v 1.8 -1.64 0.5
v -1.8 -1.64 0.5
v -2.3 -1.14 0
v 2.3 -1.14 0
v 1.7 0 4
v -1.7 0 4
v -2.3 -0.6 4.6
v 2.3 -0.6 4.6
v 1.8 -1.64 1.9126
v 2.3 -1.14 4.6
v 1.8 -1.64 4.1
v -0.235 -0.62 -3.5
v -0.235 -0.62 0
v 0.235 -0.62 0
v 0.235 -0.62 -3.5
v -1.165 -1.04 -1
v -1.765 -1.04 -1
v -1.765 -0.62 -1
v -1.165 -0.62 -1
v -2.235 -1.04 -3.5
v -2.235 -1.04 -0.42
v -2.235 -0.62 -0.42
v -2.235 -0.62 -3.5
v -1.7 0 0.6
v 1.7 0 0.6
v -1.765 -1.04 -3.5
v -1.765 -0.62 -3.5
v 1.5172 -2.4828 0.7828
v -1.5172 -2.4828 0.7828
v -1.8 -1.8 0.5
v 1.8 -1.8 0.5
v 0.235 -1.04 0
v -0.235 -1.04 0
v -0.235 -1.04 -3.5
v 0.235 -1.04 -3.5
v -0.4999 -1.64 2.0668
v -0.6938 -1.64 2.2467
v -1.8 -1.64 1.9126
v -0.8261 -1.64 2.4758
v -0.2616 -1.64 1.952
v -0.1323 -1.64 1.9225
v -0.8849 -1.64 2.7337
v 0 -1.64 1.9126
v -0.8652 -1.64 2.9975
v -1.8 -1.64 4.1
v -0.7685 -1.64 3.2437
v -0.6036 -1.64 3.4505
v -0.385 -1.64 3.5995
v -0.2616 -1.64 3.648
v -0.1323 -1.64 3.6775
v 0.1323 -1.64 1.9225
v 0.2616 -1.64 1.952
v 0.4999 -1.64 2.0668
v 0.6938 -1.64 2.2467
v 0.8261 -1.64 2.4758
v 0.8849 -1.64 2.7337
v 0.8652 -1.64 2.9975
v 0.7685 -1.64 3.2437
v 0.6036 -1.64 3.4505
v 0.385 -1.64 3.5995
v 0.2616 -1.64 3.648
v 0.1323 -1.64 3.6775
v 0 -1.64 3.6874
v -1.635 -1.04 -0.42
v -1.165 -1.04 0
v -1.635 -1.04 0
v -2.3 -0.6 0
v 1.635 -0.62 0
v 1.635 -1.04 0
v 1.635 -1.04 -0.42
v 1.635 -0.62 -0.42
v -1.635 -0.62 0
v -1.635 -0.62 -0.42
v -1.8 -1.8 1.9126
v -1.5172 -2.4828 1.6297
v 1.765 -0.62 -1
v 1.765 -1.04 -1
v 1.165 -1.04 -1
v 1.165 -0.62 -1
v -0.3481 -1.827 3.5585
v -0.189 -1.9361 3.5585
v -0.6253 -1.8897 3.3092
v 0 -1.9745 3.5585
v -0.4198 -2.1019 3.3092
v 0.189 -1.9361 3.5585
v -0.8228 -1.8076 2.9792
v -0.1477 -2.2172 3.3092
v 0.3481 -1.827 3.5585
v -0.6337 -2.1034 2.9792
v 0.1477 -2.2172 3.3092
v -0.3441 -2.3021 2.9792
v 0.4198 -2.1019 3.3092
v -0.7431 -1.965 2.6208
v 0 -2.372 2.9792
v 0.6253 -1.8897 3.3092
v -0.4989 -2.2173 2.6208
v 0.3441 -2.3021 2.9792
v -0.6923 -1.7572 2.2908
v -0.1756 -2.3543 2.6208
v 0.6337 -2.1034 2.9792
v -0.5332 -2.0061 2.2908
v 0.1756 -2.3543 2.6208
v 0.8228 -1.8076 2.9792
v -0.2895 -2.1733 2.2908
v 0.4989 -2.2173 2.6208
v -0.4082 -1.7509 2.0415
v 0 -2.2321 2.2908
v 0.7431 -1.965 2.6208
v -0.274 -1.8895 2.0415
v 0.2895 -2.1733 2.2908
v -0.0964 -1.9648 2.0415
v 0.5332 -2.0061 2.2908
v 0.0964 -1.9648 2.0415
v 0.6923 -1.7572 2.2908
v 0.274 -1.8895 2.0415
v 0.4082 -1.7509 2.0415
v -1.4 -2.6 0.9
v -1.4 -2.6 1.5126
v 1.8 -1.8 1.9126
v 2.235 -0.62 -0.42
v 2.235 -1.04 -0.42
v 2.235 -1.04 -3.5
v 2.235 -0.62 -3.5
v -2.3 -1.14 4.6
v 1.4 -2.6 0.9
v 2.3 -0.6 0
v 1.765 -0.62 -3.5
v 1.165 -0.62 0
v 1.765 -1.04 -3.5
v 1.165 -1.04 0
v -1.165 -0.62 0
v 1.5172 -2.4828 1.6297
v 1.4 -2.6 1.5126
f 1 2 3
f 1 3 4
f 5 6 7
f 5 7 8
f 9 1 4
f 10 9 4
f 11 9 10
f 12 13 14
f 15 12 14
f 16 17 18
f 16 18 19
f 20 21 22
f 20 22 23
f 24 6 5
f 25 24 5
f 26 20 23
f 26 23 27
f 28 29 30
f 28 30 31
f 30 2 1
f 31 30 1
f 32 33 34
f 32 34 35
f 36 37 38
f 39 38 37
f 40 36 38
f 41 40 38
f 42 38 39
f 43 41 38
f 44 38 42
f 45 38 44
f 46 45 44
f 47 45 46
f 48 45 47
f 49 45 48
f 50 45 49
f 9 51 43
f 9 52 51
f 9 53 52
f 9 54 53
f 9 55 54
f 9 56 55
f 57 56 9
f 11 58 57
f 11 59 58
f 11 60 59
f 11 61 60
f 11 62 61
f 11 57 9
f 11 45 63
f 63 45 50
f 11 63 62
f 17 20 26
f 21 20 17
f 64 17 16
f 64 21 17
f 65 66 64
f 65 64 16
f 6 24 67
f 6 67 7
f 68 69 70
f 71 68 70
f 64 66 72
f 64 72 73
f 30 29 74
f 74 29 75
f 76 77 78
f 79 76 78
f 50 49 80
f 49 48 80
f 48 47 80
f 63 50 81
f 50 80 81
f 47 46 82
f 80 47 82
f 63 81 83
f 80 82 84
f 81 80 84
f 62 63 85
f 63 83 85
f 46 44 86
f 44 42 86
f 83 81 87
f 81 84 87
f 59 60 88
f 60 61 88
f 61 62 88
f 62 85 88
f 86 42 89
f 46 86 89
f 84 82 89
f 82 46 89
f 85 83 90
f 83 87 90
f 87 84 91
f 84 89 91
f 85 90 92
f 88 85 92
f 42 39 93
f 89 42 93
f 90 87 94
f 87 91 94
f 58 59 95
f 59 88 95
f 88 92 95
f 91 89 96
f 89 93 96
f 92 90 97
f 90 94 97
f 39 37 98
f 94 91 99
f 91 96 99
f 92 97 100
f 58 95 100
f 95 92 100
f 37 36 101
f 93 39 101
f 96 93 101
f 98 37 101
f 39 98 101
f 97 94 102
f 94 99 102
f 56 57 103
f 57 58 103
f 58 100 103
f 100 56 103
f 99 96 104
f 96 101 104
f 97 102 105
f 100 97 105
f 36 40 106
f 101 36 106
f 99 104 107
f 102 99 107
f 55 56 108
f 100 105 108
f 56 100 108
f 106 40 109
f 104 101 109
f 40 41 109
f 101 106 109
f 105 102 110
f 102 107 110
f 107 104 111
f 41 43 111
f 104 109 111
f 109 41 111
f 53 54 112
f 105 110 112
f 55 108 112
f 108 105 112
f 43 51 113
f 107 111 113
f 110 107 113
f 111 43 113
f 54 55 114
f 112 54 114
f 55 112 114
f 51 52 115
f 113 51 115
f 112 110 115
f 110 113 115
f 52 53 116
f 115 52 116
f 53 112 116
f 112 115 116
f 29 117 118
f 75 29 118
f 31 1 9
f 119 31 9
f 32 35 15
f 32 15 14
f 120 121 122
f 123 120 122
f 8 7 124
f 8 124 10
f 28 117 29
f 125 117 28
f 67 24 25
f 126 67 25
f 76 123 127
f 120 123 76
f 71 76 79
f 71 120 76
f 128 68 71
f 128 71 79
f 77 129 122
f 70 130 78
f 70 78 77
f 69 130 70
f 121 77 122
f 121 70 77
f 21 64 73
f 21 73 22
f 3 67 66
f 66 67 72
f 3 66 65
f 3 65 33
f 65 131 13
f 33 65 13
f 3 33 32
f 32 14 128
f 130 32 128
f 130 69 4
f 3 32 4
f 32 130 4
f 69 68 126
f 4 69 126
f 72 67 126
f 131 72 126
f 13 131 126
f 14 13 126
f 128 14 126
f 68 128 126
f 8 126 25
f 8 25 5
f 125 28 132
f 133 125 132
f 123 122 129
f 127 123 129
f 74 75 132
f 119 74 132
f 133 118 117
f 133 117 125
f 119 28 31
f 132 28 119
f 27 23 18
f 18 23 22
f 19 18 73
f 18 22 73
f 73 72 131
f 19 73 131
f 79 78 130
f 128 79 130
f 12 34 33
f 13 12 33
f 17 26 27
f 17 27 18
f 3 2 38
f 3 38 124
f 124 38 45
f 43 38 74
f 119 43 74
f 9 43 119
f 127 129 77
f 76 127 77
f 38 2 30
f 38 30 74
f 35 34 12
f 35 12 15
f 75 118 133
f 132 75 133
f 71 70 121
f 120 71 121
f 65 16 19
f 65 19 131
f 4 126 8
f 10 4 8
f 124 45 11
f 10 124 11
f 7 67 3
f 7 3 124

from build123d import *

# Parameters (mm, degrees)
SKETCH_W         = 4.6
SKETCH_H         = 4.6
PAD_DEPTH        = 1.04
SKETCH001_W      = 0.47
SKETCH001_H      = 3.5
PAD001_DEPTH     = 0.42
CHAMFER_SIZE     = 0.6
SKETCH002_R      = 0.9
PAD002_DEPTH     = 0.45
REVOLUTION_ANGLE = 180
SKETCH004_W      = 4.6
SKETCH004_H      = 4.6
PAD003_DEPTH     = 0.6
CHAMFER001_SIZE  = 0.5
SKETCH005_W      = 3.6
SKETCH005_H      = 1.412588
PAD004_DEPTH     = 0.96
CHAMFER002_SIZE  = 0.4
CHAMFER003_SIZE  = 0.4


with BuildPart() as part:
    # Sketch → Pad (new body)
    with BuildSketch(Plane.XZ):
        with Locations((0, 2.3)):
            Rectangle(SKETCH_W, SKETCH_H)
    extrude(amount=PAD_DEPTH)

    # Sketch001 → Pad001 (new body)
    with BuildSketch(Plane.XZ.offset(1.04)):
        with Locations((0, -1.75)):
            Rectangle(SKETCH001_W, SKETCH001_H)
        Polygon((1.635, 0), (1.635, -0.42), (2.235, -0.42), (2.235, -3.5), (1.765, -3.5), (1.765, -1), (1.165, -1), (1.165, 0), align=None)
        Polygon((-1.635, 0), (-1.635, -0.42), (-2.235, -0.42), (-2.235, -3.5), (-1.765, -3.5), (-1.765, -1), (-1.165, -1), (-1.165, 0), align=None)
    extrude(amount=-PAD001_DEPTH)

    # Chamfer
    chamfer_edges = [part.edges().sort_by_distance(p)[0] for p in [
        (0, 0, 4.6),
        (2.3, 0, 2.3),
        (-2.3, 0, 2.3),
        (0, 0, 0),
    ]]
    chamfer(chamfer_edges, length=CHAMFER_SIZE)

    # Sketch002 → Pad002 (new body)
    with BuildSketch(Plane.XZ.offset(1.04)):
        with Locations((0, 2.8)):
            Circle(SKETCH002_R)
    extrude(amount=PAD002_DEPTH)

    # Sketch003 → Revolution (revolve)
    with BuildSketch(Plane.XZ.offset(1.49)):
        with BuildLine():
            ThreePointArc((-1.1e-05, 3.7), (-0.9, 2.8), (-1.1e-05, 1.9))
            Line((-1.1e-05, 3.7), (-1.1e-05, 1.9))
        make_face()
    revolve(axis=Axis((0, -1.49, 0), (0, 0, 1)), revolution_arc=REVOLUTION_ANGLE)

    # Sketch004 → Pad003 (new body)
    with BuildSketch(Plane.XZ.offset(1.04)):
        with Locations((0, 2.3)):
            Rectangle(SKETCH004_W, SKETCH004_H)
    extrude(amount=PAD003_DEPTH)

    # Chamfer001
    chamfer001_edges = [part.edges().sort_by_distance(p)[0] for p in [
        (0, -1.64, 4.6),
        (2.3, -1.64, 2.3),
        (0, -1.64, 0),
        (-2.3, -1.64, 2.3),
    ]]
    chamfer(chamfer001_edges, length=CHAMFER001_SIZE)

    # Sketch005 → Pad004 (new body)
    with BuildSketch(Plane.XZ.offset(1.64)):
        with Locations((0, 1.206294)):
            Rectangle(SKETCH005_W, SKETCH005_H)
    extrude(amount=PAD004_DEPTH)

    # Chamfer002
    chamfer002_edges = [part.edges().sort_by_distance(p)[0] for p in [
        (0, -2.6, 1.912588),
        (0, -2.6, 0.5),
        (-1.8, -2.6, 1.206294),
        (1.8, -2.6, 1.206294),
    ]]
    chamfer(chamfer002_edges, length=CHAMFER002_SIZE)

    # Chamfer003
    chamfer003_edges = [part.edges().sort_by_distance(p)[0] for p in [
        (0, -2.2, 1.912588),
        (1.8, -2.2, 1.206294),
        (0, -2.2, 0.5),
        (-1.8, -2.2, 1.206294),
    ]]
    chamfer(chamfer003_edges, length=CHAMFER003_SIZE)


solid = part.part
